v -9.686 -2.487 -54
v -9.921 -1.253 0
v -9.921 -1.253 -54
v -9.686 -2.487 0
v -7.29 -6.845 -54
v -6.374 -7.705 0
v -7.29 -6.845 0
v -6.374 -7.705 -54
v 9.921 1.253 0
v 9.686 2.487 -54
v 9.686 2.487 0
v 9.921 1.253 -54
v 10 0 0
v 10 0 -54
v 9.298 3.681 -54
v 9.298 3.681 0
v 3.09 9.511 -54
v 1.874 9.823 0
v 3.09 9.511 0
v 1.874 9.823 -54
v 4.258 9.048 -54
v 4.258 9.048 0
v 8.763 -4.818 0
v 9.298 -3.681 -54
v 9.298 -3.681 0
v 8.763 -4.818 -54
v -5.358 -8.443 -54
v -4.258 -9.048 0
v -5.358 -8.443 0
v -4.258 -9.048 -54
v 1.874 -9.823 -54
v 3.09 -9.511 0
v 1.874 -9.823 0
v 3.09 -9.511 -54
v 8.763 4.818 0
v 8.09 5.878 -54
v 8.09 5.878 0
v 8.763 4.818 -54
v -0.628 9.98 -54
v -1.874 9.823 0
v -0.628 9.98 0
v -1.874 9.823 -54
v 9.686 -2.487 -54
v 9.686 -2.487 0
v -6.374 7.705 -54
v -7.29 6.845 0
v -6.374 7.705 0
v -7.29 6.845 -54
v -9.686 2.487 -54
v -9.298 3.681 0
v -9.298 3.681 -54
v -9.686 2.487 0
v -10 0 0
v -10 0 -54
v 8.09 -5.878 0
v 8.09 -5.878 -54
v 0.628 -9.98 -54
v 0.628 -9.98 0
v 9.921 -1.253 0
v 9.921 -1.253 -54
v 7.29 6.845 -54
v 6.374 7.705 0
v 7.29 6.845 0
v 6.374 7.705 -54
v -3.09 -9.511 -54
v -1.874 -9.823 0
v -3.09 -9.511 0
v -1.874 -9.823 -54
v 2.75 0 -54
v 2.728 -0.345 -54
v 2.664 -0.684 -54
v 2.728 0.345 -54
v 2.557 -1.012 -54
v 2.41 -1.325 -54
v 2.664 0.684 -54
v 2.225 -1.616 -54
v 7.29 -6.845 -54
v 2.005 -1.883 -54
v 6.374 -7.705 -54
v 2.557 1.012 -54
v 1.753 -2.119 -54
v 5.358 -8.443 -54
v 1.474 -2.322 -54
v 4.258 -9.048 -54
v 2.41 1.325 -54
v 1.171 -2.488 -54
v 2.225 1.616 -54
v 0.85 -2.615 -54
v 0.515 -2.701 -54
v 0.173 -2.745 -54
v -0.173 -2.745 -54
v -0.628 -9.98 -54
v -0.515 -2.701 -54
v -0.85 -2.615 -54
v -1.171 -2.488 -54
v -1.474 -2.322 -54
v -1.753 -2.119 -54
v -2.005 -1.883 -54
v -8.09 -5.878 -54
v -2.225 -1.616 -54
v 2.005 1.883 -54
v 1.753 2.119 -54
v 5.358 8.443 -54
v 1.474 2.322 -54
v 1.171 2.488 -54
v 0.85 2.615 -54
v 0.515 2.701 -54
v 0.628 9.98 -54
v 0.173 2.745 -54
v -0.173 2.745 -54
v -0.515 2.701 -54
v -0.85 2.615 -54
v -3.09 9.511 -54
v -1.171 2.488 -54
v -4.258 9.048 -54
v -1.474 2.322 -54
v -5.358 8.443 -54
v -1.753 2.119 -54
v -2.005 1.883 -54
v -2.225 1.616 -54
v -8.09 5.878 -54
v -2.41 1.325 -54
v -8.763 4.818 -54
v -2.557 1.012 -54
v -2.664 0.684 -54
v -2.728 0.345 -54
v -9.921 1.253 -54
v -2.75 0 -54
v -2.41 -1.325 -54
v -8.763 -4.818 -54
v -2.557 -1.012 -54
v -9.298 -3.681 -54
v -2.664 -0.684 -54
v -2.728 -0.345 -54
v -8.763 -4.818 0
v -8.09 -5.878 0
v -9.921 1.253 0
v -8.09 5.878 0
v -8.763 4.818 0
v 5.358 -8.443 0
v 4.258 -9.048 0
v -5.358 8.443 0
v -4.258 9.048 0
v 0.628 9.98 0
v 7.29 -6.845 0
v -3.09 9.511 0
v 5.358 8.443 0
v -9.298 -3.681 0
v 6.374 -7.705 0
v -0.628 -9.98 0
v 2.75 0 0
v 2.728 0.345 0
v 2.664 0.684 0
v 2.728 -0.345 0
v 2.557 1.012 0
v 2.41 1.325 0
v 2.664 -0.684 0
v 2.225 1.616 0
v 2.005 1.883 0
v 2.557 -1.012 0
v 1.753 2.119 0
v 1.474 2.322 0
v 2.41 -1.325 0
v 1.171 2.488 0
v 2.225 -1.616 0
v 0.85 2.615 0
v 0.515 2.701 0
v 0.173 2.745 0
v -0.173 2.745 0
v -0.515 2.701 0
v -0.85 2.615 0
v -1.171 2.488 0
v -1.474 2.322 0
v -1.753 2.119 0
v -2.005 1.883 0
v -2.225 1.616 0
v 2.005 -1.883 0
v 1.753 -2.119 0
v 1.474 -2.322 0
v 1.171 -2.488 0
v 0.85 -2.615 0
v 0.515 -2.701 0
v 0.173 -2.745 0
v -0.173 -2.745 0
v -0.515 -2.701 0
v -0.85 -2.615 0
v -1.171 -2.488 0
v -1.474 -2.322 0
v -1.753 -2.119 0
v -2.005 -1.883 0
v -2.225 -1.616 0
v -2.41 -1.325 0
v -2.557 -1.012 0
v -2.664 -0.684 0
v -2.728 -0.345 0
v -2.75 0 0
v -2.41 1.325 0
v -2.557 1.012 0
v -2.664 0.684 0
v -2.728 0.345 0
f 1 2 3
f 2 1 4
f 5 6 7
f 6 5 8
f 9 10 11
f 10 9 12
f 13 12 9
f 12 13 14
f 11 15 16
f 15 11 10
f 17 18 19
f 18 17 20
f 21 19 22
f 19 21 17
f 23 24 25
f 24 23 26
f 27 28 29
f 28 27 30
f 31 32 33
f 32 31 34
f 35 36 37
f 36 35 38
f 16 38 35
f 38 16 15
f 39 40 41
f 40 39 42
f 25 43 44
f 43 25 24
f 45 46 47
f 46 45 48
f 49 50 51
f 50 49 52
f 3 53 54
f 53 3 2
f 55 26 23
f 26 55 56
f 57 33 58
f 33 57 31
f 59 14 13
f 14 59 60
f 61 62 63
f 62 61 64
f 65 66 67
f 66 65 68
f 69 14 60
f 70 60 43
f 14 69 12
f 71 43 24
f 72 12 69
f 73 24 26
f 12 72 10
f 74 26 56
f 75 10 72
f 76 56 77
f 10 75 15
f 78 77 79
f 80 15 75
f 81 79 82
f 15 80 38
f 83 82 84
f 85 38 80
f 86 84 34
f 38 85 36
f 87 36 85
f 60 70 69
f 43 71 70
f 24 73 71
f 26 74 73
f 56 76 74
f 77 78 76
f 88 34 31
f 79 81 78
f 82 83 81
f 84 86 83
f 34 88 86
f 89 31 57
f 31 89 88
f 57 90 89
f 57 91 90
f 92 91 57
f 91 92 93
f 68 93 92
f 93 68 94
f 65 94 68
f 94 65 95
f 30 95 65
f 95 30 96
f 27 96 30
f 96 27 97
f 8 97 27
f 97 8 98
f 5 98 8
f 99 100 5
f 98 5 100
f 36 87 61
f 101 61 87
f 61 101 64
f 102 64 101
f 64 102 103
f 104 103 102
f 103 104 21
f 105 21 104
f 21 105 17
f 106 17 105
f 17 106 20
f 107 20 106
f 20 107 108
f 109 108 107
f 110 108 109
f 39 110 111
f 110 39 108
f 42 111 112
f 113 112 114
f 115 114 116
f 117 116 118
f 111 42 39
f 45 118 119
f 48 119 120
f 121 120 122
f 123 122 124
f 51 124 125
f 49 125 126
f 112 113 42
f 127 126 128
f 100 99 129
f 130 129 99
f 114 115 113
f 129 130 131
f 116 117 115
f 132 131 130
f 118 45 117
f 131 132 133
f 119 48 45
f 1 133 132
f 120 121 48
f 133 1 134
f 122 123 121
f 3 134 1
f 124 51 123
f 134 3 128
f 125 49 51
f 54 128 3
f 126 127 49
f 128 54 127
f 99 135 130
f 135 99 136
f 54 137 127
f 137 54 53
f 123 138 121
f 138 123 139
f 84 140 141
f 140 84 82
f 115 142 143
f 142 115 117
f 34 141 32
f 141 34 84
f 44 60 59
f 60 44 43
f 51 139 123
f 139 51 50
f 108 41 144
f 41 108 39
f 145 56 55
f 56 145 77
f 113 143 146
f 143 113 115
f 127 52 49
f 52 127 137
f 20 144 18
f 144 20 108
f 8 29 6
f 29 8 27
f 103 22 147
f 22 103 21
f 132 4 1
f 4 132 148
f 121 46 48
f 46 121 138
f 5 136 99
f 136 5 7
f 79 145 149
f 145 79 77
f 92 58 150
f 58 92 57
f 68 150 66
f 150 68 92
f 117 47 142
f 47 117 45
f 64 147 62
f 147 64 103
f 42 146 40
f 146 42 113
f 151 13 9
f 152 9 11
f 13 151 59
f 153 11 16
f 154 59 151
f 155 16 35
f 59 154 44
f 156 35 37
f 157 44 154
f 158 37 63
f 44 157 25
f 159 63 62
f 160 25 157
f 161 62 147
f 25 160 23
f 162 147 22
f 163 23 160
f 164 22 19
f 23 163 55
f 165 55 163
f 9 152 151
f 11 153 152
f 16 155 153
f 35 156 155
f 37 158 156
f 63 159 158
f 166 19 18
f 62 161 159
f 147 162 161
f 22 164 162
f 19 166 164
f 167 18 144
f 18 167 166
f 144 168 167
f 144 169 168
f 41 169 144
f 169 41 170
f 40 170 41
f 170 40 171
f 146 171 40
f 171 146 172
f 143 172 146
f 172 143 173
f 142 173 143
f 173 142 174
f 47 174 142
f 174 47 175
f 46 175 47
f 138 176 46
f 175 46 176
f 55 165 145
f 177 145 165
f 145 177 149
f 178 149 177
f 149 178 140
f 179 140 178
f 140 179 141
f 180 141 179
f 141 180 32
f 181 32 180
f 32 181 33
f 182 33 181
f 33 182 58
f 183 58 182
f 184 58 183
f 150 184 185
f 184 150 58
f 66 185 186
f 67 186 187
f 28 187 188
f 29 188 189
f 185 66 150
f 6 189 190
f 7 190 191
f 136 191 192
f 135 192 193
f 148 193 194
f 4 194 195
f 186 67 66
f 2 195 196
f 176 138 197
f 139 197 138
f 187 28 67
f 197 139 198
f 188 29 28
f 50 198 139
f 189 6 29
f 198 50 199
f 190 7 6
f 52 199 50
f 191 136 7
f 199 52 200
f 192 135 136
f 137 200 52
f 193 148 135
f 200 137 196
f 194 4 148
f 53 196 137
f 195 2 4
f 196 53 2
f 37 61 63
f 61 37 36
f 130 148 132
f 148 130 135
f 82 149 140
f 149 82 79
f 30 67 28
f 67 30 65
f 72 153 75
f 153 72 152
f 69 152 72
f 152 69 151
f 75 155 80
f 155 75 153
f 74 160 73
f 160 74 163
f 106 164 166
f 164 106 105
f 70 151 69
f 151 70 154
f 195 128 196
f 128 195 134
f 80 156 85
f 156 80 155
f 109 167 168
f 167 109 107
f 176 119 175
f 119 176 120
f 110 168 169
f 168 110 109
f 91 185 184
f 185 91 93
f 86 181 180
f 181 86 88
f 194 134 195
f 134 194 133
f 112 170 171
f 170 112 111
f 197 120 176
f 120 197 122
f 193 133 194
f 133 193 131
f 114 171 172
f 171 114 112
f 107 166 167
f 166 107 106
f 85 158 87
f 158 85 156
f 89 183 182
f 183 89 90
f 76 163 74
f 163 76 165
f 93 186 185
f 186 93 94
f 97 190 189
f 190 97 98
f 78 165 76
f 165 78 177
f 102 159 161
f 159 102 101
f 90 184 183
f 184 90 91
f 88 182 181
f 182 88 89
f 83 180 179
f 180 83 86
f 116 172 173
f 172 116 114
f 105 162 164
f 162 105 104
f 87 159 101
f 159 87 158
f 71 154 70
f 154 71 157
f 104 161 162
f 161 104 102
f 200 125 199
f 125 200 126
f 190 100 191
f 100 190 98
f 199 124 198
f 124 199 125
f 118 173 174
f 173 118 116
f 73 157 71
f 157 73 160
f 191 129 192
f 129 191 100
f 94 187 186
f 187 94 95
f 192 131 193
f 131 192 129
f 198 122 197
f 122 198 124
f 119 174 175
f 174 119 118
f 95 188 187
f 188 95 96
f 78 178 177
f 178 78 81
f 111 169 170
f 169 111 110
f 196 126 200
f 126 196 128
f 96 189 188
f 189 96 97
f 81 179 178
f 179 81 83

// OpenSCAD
$fn = 50;


difference() {
	union() {
		translate(v = [0, 0, -54.0000000000]) {
			cylinder(h = 54, r = 10.0000000000);
		}
		cylinder(h = 0, r = 16.0000000000);
	}
	union() {
		#translate(v = [0, 0, -54]) {
			cylinder(h = 54, r = 2.7500000000);
		}
	}
}
